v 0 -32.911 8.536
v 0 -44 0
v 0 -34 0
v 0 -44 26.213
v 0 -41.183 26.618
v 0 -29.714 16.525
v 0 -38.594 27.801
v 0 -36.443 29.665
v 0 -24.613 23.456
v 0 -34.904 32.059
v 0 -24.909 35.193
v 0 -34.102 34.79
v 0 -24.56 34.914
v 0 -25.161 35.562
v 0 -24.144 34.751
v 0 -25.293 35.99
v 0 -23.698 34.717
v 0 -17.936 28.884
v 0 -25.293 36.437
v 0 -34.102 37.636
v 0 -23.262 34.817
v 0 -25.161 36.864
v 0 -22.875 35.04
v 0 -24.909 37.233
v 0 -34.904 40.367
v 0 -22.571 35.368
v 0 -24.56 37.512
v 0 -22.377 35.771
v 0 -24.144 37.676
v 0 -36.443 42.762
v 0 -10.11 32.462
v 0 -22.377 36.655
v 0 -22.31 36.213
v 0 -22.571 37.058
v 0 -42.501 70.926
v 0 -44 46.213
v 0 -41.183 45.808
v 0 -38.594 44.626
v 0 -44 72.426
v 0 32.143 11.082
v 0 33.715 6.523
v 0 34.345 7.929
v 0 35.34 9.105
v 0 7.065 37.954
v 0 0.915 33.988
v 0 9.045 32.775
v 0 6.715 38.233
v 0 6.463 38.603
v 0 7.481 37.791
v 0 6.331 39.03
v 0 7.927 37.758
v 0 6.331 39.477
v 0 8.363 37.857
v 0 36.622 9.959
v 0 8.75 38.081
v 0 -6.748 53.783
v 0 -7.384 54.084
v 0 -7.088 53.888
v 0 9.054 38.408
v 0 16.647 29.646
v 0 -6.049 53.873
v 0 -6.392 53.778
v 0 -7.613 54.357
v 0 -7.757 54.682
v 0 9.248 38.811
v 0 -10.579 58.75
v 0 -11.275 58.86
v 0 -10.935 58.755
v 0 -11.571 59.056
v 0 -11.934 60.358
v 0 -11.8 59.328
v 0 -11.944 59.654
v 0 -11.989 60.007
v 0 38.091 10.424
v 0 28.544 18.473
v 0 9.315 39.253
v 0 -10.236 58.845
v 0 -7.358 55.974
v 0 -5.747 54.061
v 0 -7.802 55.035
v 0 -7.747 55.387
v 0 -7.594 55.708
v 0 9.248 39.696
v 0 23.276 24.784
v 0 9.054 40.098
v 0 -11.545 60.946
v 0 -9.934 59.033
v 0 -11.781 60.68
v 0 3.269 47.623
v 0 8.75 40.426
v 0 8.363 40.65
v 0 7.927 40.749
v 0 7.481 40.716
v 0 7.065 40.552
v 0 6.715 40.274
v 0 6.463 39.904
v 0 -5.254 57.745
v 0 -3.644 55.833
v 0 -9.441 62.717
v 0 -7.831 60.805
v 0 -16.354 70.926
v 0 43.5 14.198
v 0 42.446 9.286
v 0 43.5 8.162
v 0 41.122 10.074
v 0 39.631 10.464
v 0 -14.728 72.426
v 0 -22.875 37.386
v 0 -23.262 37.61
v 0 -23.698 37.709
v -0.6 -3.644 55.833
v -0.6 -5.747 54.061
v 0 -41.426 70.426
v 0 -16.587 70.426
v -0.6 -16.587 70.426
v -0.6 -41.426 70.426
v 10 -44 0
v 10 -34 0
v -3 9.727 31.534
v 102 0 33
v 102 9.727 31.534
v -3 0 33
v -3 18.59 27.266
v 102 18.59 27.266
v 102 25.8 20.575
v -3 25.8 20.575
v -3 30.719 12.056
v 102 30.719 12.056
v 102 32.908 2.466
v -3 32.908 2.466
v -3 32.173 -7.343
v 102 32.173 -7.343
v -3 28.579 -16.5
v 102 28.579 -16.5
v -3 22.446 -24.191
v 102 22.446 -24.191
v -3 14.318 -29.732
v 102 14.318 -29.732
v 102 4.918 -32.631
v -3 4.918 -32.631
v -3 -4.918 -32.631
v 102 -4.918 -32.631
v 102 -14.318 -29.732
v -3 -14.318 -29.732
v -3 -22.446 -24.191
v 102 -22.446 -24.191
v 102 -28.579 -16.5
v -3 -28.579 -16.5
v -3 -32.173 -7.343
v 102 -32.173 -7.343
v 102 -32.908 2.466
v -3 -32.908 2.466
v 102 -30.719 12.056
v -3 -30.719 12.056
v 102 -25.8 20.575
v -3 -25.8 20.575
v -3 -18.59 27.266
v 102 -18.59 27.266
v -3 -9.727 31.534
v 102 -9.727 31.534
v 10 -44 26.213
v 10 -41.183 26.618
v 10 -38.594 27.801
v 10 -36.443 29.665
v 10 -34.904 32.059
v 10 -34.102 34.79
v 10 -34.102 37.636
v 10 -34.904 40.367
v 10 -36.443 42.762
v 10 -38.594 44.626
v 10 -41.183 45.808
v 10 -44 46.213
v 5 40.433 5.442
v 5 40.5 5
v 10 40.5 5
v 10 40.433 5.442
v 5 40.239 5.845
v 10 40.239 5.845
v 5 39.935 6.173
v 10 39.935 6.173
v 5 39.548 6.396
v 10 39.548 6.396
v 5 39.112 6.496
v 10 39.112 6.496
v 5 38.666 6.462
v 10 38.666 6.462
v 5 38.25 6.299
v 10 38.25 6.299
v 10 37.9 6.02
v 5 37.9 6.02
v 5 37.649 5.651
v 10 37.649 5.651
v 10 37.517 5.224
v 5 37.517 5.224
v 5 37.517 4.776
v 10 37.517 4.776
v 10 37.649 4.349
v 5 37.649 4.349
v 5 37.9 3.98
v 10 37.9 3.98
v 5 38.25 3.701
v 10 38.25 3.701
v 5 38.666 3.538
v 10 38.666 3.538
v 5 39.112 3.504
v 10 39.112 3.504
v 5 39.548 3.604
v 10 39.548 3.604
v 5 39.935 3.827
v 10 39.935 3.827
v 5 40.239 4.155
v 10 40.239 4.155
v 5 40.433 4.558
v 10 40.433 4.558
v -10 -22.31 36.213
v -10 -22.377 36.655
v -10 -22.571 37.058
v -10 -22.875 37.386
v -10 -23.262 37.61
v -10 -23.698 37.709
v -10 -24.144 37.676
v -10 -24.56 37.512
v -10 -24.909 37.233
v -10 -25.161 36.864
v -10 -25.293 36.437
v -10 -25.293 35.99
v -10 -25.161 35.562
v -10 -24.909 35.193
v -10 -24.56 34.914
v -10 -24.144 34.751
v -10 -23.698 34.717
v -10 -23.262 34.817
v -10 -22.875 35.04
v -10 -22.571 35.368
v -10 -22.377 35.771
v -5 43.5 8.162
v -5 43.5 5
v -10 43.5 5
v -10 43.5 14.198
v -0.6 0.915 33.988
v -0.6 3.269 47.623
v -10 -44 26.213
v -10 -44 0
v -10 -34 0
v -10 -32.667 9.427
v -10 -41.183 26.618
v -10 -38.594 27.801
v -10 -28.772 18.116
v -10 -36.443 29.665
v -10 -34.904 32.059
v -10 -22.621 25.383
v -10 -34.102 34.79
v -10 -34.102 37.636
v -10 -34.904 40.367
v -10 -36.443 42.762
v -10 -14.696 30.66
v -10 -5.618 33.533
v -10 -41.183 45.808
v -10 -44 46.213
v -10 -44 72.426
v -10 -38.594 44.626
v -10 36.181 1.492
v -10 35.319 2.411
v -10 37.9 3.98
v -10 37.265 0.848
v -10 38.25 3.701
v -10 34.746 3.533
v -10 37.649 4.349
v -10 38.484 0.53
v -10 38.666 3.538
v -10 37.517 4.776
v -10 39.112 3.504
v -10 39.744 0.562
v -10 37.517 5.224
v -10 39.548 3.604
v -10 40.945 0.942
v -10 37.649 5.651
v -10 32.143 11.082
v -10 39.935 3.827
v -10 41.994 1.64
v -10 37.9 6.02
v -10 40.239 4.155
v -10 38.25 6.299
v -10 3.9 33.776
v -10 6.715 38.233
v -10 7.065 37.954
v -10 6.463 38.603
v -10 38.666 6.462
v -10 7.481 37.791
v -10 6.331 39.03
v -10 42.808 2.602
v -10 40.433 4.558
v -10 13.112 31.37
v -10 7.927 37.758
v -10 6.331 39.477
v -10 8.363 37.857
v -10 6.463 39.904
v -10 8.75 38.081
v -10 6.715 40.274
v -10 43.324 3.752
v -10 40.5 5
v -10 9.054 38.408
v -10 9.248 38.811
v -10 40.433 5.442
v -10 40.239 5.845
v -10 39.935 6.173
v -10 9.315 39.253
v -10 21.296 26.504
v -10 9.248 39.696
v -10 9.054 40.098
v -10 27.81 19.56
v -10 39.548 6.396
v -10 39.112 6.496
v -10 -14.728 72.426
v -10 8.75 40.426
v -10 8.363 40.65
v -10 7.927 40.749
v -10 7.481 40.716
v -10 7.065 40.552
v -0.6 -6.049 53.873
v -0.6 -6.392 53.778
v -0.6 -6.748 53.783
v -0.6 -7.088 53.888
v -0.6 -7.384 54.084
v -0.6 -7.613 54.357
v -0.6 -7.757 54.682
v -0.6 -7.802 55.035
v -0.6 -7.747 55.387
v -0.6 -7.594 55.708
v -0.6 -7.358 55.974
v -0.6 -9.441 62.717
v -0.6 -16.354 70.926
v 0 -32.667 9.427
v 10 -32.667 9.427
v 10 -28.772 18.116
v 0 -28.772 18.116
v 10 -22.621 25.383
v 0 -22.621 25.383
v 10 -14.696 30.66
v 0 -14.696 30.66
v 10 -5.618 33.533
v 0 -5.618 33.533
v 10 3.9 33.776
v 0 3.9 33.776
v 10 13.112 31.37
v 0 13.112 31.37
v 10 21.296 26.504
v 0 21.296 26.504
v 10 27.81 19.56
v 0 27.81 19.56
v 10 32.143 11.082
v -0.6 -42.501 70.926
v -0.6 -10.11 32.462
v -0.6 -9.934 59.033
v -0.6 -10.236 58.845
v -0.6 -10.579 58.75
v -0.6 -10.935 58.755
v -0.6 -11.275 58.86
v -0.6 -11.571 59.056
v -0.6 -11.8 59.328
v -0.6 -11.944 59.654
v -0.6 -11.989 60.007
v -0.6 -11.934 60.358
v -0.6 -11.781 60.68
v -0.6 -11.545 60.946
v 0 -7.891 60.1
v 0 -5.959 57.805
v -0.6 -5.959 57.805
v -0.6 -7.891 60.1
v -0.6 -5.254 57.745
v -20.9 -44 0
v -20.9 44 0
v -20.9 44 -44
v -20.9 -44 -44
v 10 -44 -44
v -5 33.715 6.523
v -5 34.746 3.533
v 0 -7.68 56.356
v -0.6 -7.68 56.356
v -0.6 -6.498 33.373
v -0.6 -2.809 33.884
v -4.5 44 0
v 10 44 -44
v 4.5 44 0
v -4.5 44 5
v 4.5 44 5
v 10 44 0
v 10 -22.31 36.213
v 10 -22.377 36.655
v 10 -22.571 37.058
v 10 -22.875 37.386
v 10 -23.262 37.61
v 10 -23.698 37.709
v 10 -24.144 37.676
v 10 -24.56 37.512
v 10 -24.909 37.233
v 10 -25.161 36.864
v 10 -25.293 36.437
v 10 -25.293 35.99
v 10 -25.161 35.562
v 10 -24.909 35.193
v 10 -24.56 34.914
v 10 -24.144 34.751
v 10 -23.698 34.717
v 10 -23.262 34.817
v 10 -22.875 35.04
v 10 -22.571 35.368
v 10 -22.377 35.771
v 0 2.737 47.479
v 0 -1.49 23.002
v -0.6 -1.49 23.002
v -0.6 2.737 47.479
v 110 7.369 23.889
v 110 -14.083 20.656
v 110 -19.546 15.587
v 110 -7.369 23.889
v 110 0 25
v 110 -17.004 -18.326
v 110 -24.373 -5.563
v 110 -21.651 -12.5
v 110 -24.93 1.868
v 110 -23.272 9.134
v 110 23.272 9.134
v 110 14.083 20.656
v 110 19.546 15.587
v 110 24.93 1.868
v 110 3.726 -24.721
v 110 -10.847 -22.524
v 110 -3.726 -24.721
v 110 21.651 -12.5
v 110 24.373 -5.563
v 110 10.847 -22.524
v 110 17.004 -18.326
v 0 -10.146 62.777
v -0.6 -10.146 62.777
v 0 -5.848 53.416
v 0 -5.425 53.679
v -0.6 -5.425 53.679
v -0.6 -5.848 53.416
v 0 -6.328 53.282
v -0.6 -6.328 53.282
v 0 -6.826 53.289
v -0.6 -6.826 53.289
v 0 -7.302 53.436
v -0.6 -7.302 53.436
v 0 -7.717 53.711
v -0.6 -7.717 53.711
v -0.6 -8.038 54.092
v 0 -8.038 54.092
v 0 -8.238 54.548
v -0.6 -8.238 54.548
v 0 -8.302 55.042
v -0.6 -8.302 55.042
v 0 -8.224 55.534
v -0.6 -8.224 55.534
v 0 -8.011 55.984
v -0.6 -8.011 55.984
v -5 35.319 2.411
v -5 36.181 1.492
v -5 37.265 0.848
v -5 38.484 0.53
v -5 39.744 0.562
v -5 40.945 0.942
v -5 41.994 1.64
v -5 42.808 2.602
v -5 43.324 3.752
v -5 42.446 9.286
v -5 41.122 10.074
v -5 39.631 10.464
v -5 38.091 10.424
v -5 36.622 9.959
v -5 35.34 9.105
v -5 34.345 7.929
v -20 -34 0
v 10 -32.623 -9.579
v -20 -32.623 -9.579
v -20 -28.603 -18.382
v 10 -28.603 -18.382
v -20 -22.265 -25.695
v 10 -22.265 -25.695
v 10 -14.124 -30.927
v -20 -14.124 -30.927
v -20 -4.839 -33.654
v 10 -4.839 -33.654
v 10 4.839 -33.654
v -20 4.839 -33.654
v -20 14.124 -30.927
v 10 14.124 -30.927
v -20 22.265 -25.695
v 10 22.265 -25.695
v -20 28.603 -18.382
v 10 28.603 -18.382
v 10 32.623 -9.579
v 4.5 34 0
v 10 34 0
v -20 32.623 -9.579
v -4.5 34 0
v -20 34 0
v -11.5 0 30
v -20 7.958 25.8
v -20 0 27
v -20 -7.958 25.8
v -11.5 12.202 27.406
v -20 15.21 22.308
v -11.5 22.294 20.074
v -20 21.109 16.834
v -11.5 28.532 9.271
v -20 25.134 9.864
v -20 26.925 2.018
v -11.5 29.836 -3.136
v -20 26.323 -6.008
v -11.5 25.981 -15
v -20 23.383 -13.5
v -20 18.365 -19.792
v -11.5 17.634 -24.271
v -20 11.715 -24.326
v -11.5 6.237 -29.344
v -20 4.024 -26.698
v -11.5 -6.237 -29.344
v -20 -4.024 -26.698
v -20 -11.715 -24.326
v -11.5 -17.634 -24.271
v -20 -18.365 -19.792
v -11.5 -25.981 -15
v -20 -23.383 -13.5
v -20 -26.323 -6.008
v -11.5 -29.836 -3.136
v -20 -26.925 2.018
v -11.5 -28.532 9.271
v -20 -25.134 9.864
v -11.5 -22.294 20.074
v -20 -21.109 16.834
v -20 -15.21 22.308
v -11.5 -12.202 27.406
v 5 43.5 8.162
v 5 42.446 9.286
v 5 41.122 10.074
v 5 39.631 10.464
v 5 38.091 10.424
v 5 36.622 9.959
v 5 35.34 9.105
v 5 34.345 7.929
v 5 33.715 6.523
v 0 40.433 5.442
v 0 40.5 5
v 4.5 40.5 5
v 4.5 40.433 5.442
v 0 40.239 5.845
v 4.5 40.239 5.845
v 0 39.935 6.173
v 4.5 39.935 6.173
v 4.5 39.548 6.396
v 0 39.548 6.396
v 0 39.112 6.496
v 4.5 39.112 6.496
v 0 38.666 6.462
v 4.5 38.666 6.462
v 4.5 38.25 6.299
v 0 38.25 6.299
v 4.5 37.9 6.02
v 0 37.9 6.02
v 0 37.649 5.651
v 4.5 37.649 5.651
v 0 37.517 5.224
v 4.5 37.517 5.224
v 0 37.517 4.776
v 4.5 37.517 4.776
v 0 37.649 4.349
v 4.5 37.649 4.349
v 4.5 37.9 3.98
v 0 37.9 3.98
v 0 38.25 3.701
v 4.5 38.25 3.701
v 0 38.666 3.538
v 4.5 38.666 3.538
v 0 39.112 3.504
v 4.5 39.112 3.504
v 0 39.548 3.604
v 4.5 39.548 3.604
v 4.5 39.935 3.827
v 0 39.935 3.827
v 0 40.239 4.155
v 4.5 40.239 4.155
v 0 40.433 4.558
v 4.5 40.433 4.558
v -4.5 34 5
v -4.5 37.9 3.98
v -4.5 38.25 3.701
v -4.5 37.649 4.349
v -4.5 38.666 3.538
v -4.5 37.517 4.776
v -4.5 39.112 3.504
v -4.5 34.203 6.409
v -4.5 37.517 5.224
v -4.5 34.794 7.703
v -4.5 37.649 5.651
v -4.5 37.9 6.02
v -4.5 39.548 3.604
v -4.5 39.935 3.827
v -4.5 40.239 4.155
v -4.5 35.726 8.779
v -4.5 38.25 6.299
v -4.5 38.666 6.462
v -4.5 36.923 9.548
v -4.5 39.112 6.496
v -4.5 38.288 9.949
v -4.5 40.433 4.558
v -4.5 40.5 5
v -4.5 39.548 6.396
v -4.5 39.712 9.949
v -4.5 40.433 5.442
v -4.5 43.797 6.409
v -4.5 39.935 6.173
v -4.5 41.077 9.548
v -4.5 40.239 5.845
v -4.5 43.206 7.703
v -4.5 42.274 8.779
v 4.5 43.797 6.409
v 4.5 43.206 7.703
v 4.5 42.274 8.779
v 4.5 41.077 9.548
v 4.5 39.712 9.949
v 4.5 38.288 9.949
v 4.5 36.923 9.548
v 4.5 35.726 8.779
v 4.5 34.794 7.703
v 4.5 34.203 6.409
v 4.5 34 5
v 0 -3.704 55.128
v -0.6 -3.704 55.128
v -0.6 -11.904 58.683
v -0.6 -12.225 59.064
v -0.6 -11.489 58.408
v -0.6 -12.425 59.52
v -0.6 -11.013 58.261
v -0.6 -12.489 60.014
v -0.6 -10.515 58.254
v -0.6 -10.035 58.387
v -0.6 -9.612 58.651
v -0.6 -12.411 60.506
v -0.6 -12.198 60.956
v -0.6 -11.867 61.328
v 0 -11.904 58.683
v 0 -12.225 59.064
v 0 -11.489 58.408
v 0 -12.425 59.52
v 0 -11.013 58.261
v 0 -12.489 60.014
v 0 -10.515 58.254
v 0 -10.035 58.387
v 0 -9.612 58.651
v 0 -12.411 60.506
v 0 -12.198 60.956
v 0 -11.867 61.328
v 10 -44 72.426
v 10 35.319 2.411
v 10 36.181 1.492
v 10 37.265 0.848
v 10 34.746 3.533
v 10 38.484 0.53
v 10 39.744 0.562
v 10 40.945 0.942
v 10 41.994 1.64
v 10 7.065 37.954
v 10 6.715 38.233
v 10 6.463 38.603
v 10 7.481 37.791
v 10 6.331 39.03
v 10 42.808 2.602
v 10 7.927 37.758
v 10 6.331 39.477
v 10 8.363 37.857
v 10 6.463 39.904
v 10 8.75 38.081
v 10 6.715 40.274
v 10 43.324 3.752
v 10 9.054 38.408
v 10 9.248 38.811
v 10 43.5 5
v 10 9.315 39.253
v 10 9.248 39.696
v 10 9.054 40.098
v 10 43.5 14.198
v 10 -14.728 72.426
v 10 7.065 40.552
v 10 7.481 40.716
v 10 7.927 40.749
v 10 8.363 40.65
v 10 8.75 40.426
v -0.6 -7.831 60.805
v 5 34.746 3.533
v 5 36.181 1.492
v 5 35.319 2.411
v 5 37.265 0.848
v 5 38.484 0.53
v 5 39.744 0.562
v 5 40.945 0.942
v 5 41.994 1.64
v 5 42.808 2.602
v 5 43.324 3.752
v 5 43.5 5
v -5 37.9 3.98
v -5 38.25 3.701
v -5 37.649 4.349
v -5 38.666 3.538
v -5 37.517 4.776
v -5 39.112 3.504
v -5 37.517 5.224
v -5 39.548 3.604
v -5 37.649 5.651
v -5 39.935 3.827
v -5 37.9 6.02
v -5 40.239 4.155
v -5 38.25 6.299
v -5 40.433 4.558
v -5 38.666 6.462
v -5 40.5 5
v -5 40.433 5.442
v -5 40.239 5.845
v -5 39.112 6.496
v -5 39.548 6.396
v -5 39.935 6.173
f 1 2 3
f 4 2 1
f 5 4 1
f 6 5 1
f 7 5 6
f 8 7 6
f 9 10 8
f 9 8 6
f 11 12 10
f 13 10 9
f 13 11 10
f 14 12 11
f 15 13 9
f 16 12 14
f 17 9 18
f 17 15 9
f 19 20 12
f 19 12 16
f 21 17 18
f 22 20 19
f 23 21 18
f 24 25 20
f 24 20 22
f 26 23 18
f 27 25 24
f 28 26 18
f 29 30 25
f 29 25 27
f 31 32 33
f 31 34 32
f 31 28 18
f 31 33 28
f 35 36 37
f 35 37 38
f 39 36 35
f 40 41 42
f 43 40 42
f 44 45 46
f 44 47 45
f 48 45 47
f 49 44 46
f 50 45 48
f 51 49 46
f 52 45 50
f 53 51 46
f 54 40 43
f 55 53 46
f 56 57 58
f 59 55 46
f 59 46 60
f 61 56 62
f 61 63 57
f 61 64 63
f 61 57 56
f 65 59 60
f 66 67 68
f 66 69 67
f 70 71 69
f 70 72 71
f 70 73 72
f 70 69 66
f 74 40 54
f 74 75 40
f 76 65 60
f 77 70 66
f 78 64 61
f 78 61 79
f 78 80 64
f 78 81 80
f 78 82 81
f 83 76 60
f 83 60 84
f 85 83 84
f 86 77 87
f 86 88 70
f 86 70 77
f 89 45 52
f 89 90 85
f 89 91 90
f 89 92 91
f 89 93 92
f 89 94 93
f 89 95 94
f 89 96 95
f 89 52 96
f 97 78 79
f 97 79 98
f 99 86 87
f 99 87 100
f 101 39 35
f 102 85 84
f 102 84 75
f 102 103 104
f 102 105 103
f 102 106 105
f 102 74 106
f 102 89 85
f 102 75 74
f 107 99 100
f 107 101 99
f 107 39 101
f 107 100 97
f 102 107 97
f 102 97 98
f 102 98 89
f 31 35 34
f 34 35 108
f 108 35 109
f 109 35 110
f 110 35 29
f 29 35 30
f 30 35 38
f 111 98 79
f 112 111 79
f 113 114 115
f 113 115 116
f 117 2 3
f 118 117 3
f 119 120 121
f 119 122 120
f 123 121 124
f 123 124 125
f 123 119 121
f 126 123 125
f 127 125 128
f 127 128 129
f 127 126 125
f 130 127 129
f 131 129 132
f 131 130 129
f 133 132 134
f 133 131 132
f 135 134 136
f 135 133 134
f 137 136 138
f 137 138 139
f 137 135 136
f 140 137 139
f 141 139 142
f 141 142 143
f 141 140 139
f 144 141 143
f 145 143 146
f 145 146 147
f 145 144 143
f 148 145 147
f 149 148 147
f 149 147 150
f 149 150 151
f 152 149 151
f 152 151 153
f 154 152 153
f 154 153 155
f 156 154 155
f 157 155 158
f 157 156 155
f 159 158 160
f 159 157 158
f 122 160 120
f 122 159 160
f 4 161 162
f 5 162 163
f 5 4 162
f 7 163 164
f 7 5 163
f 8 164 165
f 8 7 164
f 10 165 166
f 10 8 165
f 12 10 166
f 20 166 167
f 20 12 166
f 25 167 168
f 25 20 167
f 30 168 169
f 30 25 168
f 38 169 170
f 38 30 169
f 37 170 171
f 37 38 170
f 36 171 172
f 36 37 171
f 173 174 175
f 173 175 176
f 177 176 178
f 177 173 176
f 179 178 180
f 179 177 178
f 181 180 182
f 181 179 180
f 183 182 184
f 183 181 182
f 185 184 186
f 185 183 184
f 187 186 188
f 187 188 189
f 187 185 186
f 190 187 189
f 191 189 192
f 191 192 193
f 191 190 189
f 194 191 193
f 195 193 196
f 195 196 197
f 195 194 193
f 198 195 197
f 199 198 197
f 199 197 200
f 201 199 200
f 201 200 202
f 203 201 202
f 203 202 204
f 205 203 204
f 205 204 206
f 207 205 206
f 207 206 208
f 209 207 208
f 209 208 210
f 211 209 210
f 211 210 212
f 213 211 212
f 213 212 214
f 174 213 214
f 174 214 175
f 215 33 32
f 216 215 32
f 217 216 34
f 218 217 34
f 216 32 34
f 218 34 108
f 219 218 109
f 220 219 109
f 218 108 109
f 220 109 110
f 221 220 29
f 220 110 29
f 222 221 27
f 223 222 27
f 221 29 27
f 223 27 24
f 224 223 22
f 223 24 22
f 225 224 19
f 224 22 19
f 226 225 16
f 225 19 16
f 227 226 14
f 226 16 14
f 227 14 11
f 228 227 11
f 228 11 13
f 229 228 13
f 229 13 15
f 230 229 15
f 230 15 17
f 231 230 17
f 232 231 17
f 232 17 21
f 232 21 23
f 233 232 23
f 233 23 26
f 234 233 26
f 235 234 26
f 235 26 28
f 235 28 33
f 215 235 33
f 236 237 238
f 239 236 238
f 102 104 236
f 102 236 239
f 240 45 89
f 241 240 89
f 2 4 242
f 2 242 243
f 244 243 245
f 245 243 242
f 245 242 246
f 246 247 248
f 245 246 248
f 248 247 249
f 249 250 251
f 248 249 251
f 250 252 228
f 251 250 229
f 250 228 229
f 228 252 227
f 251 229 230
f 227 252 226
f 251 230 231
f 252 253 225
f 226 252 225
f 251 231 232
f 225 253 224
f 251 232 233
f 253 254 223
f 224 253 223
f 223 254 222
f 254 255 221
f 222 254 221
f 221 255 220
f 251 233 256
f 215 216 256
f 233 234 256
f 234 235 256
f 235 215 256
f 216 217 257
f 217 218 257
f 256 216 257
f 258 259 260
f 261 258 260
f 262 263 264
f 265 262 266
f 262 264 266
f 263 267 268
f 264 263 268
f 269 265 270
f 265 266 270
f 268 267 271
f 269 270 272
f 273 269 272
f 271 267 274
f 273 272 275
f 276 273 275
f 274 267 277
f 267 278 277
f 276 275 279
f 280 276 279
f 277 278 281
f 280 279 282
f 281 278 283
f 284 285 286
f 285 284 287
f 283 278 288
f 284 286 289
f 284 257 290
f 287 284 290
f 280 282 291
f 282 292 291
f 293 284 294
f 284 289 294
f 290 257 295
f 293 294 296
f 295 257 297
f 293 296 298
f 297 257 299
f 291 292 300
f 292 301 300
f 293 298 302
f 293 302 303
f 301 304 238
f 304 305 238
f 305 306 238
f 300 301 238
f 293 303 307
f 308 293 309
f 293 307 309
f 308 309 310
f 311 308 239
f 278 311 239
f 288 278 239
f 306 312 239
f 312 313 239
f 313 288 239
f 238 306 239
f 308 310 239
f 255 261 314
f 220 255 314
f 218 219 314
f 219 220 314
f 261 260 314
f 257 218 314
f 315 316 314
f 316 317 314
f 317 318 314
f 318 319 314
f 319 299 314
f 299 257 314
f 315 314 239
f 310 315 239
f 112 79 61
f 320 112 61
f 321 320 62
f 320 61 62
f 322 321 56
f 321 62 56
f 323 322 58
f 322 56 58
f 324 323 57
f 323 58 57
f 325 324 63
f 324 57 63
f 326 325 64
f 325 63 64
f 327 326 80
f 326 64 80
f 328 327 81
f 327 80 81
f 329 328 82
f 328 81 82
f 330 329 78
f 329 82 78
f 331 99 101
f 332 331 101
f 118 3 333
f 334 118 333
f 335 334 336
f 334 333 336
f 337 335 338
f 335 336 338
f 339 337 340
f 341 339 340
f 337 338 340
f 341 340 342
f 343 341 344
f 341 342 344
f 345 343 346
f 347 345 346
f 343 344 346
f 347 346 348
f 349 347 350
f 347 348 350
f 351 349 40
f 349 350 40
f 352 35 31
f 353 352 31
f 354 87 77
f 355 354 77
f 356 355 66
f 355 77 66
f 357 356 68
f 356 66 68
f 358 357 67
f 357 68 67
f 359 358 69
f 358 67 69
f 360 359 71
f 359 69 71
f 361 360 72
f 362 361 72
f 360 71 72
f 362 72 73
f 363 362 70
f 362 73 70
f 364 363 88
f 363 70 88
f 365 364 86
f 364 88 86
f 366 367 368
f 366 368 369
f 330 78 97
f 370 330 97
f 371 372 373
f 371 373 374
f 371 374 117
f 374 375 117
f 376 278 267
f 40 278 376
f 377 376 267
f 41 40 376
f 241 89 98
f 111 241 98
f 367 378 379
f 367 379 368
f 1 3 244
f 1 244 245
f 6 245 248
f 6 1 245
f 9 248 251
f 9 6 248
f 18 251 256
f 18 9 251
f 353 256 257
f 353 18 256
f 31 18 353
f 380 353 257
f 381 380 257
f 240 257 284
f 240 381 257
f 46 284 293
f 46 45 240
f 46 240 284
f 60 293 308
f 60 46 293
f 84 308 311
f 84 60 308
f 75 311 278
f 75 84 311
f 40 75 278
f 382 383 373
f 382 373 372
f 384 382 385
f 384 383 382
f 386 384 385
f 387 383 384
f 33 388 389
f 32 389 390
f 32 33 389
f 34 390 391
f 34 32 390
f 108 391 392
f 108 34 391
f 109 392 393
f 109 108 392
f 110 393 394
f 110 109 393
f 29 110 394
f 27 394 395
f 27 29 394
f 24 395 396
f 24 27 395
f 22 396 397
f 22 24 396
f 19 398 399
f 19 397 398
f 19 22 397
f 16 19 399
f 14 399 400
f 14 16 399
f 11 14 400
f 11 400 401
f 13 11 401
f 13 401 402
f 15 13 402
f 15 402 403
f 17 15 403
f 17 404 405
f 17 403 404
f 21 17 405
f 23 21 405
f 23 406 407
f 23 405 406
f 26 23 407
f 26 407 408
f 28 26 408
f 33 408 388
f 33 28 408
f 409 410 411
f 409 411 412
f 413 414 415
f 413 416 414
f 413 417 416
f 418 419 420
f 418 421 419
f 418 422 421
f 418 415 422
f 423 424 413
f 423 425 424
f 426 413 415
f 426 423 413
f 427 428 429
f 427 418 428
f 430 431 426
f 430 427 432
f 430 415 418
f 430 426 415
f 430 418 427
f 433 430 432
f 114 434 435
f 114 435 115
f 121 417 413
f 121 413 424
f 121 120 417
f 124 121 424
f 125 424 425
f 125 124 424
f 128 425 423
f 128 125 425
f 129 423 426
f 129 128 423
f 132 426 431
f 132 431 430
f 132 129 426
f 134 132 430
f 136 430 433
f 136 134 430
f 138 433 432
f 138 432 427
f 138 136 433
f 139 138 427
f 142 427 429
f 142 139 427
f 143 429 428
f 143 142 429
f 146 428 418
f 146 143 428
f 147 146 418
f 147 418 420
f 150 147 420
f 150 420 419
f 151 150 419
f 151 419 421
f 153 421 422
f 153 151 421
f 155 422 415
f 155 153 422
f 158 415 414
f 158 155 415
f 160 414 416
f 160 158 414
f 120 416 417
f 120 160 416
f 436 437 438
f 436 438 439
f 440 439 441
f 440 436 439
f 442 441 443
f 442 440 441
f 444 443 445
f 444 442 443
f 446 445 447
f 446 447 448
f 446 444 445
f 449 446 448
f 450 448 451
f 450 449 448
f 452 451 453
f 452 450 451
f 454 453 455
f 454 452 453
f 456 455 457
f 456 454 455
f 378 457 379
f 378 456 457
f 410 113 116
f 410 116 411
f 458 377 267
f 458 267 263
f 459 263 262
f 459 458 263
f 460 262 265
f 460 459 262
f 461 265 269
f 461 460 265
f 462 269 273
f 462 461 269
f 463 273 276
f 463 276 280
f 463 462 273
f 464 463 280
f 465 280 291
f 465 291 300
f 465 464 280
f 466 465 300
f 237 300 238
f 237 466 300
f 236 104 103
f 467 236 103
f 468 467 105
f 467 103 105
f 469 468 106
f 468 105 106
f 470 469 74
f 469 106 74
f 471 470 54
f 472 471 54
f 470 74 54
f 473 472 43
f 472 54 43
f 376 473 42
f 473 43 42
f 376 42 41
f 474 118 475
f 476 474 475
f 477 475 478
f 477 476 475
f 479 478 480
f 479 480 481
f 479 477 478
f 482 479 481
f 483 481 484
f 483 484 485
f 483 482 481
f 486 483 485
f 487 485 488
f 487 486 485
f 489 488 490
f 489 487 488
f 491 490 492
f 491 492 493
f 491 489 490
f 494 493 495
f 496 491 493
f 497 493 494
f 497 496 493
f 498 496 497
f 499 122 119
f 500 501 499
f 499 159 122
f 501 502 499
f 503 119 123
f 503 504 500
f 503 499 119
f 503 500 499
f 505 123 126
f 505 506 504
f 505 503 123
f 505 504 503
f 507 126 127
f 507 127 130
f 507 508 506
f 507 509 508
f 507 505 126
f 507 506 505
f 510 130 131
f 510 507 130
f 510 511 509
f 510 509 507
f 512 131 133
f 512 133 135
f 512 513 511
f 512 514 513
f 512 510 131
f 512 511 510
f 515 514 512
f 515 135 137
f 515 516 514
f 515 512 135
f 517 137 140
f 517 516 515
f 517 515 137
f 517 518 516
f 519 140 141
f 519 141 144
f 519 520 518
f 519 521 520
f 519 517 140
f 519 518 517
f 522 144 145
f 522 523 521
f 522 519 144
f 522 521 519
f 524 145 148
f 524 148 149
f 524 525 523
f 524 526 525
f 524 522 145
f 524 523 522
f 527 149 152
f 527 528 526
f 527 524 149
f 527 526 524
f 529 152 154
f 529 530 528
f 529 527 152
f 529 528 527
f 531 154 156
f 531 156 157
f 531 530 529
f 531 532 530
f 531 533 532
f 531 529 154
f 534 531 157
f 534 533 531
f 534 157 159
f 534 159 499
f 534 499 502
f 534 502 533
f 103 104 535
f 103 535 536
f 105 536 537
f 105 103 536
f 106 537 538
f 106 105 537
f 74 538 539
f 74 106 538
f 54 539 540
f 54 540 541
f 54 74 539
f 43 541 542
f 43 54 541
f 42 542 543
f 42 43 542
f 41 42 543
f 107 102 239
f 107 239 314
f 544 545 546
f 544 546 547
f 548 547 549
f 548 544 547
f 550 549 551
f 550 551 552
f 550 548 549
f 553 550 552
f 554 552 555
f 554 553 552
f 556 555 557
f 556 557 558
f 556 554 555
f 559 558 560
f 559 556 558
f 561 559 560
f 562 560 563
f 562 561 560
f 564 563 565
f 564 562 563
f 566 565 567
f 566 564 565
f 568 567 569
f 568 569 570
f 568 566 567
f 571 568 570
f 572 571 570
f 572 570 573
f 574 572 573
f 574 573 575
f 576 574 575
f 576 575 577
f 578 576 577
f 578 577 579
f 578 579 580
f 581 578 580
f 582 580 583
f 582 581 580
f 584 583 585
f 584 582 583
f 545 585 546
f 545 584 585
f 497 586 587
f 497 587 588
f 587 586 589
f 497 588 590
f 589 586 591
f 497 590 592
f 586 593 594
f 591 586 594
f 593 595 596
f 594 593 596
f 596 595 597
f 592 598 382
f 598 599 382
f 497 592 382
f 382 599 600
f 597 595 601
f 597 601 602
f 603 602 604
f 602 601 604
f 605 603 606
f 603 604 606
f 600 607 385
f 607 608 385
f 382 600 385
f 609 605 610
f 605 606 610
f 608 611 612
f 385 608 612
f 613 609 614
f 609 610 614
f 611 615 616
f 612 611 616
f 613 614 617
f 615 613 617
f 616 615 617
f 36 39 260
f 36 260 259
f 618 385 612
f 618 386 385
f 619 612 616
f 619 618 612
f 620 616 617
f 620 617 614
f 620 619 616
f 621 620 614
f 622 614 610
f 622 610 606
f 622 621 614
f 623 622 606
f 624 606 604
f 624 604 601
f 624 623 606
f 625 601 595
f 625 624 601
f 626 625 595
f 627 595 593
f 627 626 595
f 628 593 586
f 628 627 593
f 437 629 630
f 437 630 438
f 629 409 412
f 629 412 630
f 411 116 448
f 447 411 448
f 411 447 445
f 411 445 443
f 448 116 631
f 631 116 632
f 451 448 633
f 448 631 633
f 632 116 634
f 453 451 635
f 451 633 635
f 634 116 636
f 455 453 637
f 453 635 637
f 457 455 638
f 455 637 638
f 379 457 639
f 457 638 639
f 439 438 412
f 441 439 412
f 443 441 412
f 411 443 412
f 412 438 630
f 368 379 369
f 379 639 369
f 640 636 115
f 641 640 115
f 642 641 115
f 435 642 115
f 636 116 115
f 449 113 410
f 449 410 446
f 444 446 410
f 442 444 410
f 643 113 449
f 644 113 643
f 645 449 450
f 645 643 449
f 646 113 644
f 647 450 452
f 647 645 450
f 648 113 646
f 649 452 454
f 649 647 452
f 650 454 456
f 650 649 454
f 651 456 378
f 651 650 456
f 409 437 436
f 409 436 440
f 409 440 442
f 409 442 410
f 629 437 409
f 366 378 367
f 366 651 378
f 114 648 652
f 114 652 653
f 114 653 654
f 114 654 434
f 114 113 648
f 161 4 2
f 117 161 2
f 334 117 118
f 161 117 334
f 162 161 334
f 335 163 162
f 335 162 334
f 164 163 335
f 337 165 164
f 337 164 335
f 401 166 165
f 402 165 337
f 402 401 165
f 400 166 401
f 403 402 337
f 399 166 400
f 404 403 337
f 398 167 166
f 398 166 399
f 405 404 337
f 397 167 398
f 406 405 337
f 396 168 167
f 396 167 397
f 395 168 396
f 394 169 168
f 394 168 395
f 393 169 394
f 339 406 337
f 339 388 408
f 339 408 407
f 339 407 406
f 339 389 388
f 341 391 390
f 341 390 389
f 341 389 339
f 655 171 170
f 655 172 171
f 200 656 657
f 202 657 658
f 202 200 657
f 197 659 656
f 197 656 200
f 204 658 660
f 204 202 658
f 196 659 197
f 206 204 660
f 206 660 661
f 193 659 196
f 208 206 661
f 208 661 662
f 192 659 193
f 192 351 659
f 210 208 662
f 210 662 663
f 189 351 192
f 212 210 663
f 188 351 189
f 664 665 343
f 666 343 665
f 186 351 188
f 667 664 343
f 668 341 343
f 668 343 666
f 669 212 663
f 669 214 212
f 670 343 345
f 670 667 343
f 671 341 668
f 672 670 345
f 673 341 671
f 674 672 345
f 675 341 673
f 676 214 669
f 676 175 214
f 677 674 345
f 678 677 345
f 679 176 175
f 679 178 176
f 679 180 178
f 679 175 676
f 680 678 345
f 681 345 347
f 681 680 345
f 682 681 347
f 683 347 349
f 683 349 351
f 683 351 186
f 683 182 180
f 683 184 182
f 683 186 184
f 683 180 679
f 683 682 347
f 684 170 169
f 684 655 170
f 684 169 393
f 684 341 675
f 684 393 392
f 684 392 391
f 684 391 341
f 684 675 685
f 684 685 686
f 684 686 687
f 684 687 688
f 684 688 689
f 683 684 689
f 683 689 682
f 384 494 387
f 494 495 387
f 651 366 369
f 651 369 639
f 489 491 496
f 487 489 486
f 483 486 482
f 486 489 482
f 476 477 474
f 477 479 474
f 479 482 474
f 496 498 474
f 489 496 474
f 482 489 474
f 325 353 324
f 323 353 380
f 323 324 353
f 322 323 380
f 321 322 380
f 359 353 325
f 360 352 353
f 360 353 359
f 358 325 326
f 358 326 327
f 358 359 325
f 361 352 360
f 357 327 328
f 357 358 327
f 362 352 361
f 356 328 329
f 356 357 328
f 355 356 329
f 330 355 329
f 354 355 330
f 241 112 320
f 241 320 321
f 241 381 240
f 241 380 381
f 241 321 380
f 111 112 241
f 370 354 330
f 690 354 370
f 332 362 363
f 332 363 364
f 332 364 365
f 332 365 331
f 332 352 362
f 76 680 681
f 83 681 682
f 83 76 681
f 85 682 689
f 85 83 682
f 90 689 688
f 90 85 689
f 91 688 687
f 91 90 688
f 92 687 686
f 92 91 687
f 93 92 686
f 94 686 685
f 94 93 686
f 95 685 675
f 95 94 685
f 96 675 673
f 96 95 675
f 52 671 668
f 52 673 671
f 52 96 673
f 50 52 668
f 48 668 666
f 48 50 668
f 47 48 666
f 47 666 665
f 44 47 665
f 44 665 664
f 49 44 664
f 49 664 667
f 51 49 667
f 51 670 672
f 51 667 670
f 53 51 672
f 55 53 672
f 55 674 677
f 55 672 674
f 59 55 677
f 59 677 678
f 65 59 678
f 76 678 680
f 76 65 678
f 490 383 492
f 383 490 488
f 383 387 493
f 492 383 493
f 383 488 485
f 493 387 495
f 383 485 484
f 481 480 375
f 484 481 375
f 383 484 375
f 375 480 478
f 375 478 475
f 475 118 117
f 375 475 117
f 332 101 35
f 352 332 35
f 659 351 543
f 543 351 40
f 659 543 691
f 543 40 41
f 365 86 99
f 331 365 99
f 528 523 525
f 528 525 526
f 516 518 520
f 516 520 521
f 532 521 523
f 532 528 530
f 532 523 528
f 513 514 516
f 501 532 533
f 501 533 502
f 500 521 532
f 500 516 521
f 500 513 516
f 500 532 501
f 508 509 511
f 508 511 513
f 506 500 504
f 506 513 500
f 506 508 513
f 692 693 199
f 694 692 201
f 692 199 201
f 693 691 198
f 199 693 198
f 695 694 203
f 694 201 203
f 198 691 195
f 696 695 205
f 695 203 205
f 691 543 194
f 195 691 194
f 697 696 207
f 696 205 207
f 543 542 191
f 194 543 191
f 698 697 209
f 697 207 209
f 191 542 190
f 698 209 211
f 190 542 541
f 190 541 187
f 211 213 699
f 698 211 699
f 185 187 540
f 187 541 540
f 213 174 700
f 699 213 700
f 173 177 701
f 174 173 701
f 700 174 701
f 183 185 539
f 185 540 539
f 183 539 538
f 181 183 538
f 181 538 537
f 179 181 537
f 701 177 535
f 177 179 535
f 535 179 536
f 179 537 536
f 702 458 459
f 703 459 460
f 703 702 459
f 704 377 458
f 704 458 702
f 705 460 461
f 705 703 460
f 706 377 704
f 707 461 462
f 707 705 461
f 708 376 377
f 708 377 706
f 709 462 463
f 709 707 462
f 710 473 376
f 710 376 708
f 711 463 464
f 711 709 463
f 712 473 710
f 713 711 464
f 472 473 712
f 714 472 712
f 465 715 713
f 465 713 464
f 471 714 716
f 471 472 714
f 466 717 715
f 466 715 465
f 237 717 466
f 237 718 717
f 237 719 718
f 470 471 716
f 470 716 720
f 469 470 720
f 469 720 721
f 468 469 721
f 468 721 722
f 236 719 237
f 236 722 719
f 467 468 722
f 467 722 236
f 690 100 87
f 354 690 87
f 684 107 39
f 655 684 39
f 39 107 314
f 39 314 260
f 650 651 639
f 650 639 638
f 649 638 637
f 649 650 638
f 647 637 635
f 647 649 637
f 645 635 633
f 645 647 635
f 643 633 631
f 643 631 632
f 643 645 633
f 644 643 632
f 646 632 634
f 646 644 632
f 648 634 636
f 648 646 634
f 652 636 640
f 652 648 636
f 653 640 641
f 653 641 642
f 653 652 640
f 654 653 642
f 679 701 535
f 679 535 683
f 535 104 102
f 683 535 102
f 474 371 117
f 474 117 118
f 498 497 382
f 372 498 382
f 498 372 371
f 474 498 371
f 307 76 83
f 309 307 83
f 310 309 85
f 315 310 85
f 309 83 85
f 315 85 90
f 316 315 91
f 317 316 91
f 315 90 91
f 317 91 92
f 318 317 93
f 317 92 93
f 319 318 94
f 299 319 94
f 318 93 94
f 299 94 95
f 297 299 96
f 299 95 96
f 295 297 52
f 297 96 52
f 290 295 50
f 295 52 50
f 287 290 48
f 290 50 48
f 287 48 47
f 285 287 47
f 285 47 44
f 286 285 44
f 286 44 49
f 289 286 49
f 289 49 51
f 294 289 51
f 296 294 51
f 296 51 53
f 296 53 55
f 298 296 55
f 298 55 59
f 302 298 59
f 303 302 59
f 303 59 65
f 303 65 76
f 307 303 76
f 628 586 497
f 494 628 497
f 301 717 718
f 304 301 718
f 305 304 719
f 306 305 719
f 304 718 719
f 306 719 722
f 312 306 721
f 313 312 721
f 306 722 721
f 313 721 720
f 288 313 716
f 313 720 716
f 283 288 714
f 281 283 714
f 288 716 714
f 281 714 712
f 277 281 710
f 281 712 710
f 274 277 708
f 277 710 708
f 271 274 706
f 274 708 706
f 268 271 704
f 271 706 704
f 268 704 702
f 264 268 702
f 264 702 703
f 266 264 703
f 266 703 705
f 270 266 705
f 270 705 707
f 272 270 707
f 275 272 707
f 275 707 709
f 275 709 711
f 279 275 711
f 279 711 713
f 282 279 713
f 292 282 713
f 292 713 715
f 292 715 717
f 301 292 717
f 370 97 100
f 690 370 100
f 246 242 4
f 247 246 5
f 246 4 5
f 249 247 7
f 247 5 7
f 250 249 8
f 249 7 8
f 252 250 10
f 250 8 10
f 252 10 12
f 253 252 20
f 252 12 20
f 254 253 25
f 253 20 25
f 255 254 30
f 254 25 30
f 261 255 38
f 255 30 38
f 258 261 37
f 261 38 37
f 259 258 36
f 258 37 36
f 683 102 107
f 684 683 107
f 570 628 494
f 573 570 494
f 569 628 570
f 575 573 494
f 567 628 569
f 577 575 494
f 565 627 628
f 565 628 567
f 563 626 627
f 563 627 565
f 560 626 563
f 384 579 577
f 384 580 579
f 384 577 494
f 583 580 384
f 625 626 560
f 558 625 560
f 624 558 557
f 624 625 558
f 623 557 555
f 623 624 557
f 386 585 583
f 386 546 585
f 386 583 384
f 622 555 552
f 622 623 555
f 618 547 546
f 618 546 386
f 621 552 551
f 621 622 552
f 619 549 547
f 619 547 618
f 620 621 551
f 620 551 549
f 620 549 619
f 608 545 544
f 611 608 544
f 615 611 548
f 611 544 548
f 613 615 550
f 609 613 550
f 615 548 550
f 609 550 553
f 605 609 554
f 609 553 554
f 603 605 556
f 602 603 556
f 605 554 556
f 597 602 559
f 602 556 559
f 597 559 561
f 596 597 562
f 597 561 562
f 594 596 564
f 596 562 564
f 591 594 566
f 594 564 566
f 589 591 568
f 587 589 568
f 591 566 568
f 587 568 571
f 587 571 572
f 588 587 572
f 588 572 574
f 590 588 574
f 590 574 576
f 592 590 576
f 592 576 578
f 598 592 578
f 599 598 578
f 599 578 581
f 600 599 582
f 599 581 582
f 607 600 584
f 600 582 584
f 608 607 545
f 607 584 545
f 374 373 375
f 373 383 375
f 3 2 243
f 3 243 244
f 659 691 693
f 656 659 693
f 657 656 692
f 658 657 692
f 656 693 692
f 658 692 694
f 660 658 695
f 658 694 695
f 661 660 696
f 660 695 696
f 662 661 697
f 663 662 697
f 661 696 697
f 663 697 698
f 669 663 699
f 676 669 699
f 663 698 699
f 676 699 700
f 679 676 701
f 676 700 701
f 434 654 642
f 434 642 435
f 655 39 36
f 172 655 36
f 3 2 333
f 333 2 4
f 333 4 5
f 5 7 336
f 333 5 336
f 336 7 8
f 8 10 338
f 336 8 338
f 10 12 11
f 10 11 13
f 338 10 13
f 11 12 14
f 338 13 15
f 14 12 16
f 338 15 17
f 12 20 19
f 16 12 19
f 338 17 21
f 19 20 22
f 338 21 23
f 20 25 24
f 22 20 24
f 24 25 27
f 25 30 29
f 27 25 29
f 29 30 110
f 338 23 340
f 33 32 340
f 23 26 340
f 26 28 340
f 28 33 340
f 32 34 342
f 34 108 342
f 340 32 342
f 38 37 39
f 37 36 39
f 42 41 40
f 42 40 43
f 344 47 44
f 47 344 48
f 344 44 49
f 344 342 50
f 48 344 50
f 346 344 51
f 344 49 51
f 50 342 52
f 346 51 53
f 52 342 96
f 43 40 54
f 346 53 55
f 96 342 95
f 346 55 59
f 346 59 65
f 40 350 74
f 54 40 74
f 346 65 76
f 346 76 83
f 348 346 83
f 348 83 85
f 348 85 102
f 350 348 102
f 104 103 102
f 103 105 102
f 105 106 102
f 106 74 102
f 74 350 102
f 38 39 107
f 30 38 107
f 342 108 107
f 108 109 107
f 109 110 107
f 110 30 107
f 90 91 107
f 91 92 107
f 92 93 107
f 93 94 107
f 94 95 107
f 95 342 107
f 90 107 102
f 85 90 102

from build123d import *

# Parameters (mm, degrees)
F3_DEPTH       = 0.6
F6_DEPTH       = 30
F7_DEPTH       = 0.9
F8_R           = 1.5
F9_DEPTH       = 4.5
F9_DEPTH_BACK  = 4.5
F10_R          = 1.5
F11_DEPTH      = 10
F13_DEPTH      = 0.6
F14_DEPTH      = 10
F12_R          = 5.5
F15_DEPTH      = 5
F15_DEPTH_BACK = 5
F12_R_2        = 10
F12_R_3        = 1.5
F16_DEPTH      = 20.901
F16_DEPTH_BACK = 110.001


with BuildPart() as f1:
    # F0 (on Front) → F1 (revolve)
    with BuildSketch(Plane.XZ):
        Polygon((-20, 27), (-20, 0), (110, 0), (110, 25), (102, 33), (-3, 33), align=None)
    revolve(axis=Axis((45, 0, 0), (-1, 0, 0)))


with BuildPart() as f3:
    # F2 (on Right) → F3 (new body)
    with BuildSketch(Plane.YZ):
        with BuildLine():
            Line((-1.4899937615, 23.0019125879), (2.7371470702, 47.4790709277))
            Line((2.7371470702, 47.4790709277), (-3.7042103876, 55.1281829089))
            Line((-3.7042103876, 55.1281829089), (-5.4252605834, 53.6788774808))
            ThreePointArc((-5.4252605834, 53.6788774808), (-7.8910927352, 53.8902345224), (-7.6797356936, 56.3560666743))
            Line((-7.6797356936, 56.3560666743), (-5.9586854978, 57.8053721023))
            Line((-5.9586854978, 57.8053721023), (-7.8910927352, 60.1001056966))
            Line((-7.8910927352, 60.1001056966), (-9.6121429309, 58.6508002686))
            ThreePointArc((-9.6121429309, 58.6508002686), (-12.0779750828, 58.8621573102), (-11.8666180412, 61.327989462))
            Line((-11.8666180412, 61.327989462), (-10.1455678454, 62.77729489))
            Line((-10.1455678454, 62.77729489), (-16.5869253033, 70.4264068712))
            Line((-16.5869253033, 70.4264068712), (-41.42641, 70.4264068712))
            Line((-41.42641, 70.4264068712), (-1.4899937615, 23.0019125879))
        make_face()
    extrude(amount=-F3_DEPTH)


with BuildPart() as f6:
    # F5 (on offset) → F6 (new body)
    with BuildSketch(Plane(origin=(-20, 0, 0), x_dir=(0, -1, 0), z_dir=(-1, 0, 0))):
        with BuildLine():
            ThreePointArc((34, 0), (0, -34), (-34, 0))
            Line((-34, 0), (-44, 0))
            Line((-44, 0), (-44, -44))
            Line((-44, -44), (44, -44))
            Line((44, -44), (44, 0))
            Line((44, 0), (34, 0))
        make_face()
    extrude(amount=-F6_DEPTH)

    # F5 (on offset) → F7 (join)
    with BuildSketch(Plane(origin=(-20, 0, 0), x_dir=(0, -1, 0), z_dir=(-1, 0, 0))):
        with BuildLine():
            Line((34, 0), (-34, 0))
            ThreePointArc((-34, 0), (0, -34), (34, 0))
        make_face()
        with BuildLine():
            ThreePointArc((34, 0), (0, -34), (-34, 0))
            Line((-34, 0), (-44, 0))
            Line((-44, 0), (-44, -44))
            Line((-44, -44), (44, -44))
            Line((44, -44), (44, 0))
            Line((44, 0), (34, 0))
        make_face()
    extrude(amount=F7_DEPTH)

    # F8 (on Right) → F9 (join, two sides)
    with BuildSketch(Plane.YZ) as f9_sk:
        with BuildLine():
            Line((34, 0), (44, 0))
            Line((44, 0), (44, 5))
            ThreePointArc((44, 5), (39, 10), (34, 5))
            Line((34, 5), (34, 0))
        make_face()
        with Locations((39, 5)):
            Circle(F8_R, mode=Mode.SUBTRACT)
    extrude(amount=F9_DEPTH)
    extrude(f9_sk.sketch, amount=-F9_DEPTH_BACK)


with BuildPart() as f11:
    # F10 (on Right) → F11 (new body)
    with BuildSketch(Plane.YZ):
        with BuildLine():
            Line((-44, 72.4264068712), (-44, 0))
            Line((-44, 0), (-34, 0))
            ThreePointArc((-34, 0), (-5.6180613128, 33.5326316755), (32.1433757109, 11.0816694549))
            Line((32.1433757109, 11.0816694549), (34.7457296853, 3.5333084545))
            ThreePointArc((34.7457296853, 3.5333084545), (38.2564330615, 9.4381424276), (43.5, 5))
            Line((43.5, 5), (43.5, 14.1984848098))
            Line((43.5, 14.1984848098), (-14.7279220614, 72.4264068712))
            Line((-14.7279220614, 72.4264068712), (-44, 72.4264068712))
        make_face()
        with BuildLine():
            ThreePointArc((43.5, 5), (38.2564330615, 9.4381424276), (34.7457296853, 3.5333084545))
            ThreePointArc((34.7457296853, 3.5333084545), (39.7435669385, 0.5618575724), (43.5, 5))
        make_face()
        with Locations((39, 5)):
            Circle(F10_R, mode=Mode.SUBTRACT)
    extrude(amount=-F11_DEPTH)

    # F12 (on Right) → F13 (cut)
    with BuildSketch(Plane.YZ):
        with BuildLine():
            Line((3.26944025, 47.6232066735), (-3.6438226614, 55.8327063808))
            Line((-3.6438226614, 55.8327063808), (-5.7473284563, 54.0613330799))
            ThreePointArc((-5.7473284563, 54.0613330799), (-7.5086371361, 54.2123023953), (-7.3576678207, 55.9736110752))
            Line((-7.3576678207, 55.9736110752), (-5.2541620259, 57.7449843761))
            Line((-5.2541620259, 57.7449843761), (-7.830705009, 60.8046291686))
            Line((-7.830705009, 60.8046291686), (-9.9342108038, 59.0332558677))
            ThreePointArc((-9.9342108038, 59.0332558677), (-11.6955194837, 59.1842251831), (-11.5445501683, 60.945533863))
            Line((-11.5445501683, 60.945533863), (-9.4410443735, 62.7169071639))
            Line((-9.4410443735, 62.7169071639), (-16.3543072849, 70.9264068712))
            Line((-16.3543072849, 70.9264068712), (-42.5011332815, 70.9264068712))
            Line((-42.5011332815, 70.9264068712), (-1.1801816781, 21.8577768422))
            Line((-1.1801816781, 21.8577768422), (3.26944025, 47.6232066735))
        make_face()
    extrude(amount=-F13_DEPTH, mode=Mode.SUBTRACT)


with BuildPart() as f14:
    # F10 (on Right) → F14 (new body)
    with BuildSketch(Plane.YZ):
        with BuildLine():
            Line((-44, 72.4264068712), (-44, 0))
            Line((-44, 0), (-34, 0))
            ThreePointArc((-34, 0), (-5.6180613128, 33.5326316755), (32.1433757109, 11.0816694549))
            Line((32.1433757109, 11.0816694549), (34.7457296853, 3.5333084545))
            ThreePointArc((34.7457296853, 3.5333084545), (38.2564330615, 9.4381424276), (43.5, 5))
            Line((43.5, 5), (43.5, 14.1984848098))
            Line((43.5, 14.1984848098), (-14.7279220614, 72.4264068712))
            Line((-14.7279220614, 72.4264068712), (-44, 72.4264068712))
        make_face()
        with BuildLine():
            ThreePointArc((43.5, 5), (38.2564330615, 9.4381424276), (34.7457296853, 3.5333084545))
            ThreePointArc((34.7457296853, 3.5333084545), (39.7435669385, 0.5618575724), (43.5, 5))
        make_face()
        with Locations((39, 5)):
            Circle(F10_R, mode=Mode.SUBTRACT)
    extrude(amount=F14_DEPTH)


with BuildPart() as f15_tool:
    # F12 (on Right) → F15 (new body, two sides)
    with BuildSketch(Plane.YZ) as f15_sk:
        with Locations((39, 5)):
            Circle(F12_R)
    extrude(amount=-F15_DEPTH)
    extrude(f15_sk.sketch, amount=F15_DEPTH_BACK)


with BuildPart() as f11_1:
    add(f11.part)

    # F15: cut by f15_tool
    add(f15_tool.part, mode=Mode.SUBTRACT)


with BuildPart() as f14_1:
    add(f14.part)

    # F15: cut by f15_tool
    add(f15_tool.part, mode=Mode.SUBTRACT)


with BuildPart() as f16_tool:
    # F12 (on Right) → F16 (new body, two sides)
    with BuildSketch(Plane.YZ) as f16_sk:
        with Locations((-44, 36.2132034356)):
            Circle(F12_R_2)
        with Locations((-23.8099154085, 36.2132034356)):
            Circle(F12_R_3)
        with Locations((7.8146243468, 39.2534583807)):
            Circle(F12_R_3)
    extrude(amount=-F16_DEPTH)
    extrude(f16_sk.sketch, amount=F16_DEPTH_BACK)


with BuildPart() as f11_2:
    add(f11_1.part)

    # F16: cut by f16_tool
    add(f16_tool.part, mode=Mode.SUBTRACT)


with BuildPart() as f14_2:
    add(f14_1.part)

    # F16: cut by f16_tool
    add(f16_tool.part, mode=Mode.SUBTRACT)


solid = Compound([f1.part, f3.part, f6.part, f11_2.part, f14_2.part])
